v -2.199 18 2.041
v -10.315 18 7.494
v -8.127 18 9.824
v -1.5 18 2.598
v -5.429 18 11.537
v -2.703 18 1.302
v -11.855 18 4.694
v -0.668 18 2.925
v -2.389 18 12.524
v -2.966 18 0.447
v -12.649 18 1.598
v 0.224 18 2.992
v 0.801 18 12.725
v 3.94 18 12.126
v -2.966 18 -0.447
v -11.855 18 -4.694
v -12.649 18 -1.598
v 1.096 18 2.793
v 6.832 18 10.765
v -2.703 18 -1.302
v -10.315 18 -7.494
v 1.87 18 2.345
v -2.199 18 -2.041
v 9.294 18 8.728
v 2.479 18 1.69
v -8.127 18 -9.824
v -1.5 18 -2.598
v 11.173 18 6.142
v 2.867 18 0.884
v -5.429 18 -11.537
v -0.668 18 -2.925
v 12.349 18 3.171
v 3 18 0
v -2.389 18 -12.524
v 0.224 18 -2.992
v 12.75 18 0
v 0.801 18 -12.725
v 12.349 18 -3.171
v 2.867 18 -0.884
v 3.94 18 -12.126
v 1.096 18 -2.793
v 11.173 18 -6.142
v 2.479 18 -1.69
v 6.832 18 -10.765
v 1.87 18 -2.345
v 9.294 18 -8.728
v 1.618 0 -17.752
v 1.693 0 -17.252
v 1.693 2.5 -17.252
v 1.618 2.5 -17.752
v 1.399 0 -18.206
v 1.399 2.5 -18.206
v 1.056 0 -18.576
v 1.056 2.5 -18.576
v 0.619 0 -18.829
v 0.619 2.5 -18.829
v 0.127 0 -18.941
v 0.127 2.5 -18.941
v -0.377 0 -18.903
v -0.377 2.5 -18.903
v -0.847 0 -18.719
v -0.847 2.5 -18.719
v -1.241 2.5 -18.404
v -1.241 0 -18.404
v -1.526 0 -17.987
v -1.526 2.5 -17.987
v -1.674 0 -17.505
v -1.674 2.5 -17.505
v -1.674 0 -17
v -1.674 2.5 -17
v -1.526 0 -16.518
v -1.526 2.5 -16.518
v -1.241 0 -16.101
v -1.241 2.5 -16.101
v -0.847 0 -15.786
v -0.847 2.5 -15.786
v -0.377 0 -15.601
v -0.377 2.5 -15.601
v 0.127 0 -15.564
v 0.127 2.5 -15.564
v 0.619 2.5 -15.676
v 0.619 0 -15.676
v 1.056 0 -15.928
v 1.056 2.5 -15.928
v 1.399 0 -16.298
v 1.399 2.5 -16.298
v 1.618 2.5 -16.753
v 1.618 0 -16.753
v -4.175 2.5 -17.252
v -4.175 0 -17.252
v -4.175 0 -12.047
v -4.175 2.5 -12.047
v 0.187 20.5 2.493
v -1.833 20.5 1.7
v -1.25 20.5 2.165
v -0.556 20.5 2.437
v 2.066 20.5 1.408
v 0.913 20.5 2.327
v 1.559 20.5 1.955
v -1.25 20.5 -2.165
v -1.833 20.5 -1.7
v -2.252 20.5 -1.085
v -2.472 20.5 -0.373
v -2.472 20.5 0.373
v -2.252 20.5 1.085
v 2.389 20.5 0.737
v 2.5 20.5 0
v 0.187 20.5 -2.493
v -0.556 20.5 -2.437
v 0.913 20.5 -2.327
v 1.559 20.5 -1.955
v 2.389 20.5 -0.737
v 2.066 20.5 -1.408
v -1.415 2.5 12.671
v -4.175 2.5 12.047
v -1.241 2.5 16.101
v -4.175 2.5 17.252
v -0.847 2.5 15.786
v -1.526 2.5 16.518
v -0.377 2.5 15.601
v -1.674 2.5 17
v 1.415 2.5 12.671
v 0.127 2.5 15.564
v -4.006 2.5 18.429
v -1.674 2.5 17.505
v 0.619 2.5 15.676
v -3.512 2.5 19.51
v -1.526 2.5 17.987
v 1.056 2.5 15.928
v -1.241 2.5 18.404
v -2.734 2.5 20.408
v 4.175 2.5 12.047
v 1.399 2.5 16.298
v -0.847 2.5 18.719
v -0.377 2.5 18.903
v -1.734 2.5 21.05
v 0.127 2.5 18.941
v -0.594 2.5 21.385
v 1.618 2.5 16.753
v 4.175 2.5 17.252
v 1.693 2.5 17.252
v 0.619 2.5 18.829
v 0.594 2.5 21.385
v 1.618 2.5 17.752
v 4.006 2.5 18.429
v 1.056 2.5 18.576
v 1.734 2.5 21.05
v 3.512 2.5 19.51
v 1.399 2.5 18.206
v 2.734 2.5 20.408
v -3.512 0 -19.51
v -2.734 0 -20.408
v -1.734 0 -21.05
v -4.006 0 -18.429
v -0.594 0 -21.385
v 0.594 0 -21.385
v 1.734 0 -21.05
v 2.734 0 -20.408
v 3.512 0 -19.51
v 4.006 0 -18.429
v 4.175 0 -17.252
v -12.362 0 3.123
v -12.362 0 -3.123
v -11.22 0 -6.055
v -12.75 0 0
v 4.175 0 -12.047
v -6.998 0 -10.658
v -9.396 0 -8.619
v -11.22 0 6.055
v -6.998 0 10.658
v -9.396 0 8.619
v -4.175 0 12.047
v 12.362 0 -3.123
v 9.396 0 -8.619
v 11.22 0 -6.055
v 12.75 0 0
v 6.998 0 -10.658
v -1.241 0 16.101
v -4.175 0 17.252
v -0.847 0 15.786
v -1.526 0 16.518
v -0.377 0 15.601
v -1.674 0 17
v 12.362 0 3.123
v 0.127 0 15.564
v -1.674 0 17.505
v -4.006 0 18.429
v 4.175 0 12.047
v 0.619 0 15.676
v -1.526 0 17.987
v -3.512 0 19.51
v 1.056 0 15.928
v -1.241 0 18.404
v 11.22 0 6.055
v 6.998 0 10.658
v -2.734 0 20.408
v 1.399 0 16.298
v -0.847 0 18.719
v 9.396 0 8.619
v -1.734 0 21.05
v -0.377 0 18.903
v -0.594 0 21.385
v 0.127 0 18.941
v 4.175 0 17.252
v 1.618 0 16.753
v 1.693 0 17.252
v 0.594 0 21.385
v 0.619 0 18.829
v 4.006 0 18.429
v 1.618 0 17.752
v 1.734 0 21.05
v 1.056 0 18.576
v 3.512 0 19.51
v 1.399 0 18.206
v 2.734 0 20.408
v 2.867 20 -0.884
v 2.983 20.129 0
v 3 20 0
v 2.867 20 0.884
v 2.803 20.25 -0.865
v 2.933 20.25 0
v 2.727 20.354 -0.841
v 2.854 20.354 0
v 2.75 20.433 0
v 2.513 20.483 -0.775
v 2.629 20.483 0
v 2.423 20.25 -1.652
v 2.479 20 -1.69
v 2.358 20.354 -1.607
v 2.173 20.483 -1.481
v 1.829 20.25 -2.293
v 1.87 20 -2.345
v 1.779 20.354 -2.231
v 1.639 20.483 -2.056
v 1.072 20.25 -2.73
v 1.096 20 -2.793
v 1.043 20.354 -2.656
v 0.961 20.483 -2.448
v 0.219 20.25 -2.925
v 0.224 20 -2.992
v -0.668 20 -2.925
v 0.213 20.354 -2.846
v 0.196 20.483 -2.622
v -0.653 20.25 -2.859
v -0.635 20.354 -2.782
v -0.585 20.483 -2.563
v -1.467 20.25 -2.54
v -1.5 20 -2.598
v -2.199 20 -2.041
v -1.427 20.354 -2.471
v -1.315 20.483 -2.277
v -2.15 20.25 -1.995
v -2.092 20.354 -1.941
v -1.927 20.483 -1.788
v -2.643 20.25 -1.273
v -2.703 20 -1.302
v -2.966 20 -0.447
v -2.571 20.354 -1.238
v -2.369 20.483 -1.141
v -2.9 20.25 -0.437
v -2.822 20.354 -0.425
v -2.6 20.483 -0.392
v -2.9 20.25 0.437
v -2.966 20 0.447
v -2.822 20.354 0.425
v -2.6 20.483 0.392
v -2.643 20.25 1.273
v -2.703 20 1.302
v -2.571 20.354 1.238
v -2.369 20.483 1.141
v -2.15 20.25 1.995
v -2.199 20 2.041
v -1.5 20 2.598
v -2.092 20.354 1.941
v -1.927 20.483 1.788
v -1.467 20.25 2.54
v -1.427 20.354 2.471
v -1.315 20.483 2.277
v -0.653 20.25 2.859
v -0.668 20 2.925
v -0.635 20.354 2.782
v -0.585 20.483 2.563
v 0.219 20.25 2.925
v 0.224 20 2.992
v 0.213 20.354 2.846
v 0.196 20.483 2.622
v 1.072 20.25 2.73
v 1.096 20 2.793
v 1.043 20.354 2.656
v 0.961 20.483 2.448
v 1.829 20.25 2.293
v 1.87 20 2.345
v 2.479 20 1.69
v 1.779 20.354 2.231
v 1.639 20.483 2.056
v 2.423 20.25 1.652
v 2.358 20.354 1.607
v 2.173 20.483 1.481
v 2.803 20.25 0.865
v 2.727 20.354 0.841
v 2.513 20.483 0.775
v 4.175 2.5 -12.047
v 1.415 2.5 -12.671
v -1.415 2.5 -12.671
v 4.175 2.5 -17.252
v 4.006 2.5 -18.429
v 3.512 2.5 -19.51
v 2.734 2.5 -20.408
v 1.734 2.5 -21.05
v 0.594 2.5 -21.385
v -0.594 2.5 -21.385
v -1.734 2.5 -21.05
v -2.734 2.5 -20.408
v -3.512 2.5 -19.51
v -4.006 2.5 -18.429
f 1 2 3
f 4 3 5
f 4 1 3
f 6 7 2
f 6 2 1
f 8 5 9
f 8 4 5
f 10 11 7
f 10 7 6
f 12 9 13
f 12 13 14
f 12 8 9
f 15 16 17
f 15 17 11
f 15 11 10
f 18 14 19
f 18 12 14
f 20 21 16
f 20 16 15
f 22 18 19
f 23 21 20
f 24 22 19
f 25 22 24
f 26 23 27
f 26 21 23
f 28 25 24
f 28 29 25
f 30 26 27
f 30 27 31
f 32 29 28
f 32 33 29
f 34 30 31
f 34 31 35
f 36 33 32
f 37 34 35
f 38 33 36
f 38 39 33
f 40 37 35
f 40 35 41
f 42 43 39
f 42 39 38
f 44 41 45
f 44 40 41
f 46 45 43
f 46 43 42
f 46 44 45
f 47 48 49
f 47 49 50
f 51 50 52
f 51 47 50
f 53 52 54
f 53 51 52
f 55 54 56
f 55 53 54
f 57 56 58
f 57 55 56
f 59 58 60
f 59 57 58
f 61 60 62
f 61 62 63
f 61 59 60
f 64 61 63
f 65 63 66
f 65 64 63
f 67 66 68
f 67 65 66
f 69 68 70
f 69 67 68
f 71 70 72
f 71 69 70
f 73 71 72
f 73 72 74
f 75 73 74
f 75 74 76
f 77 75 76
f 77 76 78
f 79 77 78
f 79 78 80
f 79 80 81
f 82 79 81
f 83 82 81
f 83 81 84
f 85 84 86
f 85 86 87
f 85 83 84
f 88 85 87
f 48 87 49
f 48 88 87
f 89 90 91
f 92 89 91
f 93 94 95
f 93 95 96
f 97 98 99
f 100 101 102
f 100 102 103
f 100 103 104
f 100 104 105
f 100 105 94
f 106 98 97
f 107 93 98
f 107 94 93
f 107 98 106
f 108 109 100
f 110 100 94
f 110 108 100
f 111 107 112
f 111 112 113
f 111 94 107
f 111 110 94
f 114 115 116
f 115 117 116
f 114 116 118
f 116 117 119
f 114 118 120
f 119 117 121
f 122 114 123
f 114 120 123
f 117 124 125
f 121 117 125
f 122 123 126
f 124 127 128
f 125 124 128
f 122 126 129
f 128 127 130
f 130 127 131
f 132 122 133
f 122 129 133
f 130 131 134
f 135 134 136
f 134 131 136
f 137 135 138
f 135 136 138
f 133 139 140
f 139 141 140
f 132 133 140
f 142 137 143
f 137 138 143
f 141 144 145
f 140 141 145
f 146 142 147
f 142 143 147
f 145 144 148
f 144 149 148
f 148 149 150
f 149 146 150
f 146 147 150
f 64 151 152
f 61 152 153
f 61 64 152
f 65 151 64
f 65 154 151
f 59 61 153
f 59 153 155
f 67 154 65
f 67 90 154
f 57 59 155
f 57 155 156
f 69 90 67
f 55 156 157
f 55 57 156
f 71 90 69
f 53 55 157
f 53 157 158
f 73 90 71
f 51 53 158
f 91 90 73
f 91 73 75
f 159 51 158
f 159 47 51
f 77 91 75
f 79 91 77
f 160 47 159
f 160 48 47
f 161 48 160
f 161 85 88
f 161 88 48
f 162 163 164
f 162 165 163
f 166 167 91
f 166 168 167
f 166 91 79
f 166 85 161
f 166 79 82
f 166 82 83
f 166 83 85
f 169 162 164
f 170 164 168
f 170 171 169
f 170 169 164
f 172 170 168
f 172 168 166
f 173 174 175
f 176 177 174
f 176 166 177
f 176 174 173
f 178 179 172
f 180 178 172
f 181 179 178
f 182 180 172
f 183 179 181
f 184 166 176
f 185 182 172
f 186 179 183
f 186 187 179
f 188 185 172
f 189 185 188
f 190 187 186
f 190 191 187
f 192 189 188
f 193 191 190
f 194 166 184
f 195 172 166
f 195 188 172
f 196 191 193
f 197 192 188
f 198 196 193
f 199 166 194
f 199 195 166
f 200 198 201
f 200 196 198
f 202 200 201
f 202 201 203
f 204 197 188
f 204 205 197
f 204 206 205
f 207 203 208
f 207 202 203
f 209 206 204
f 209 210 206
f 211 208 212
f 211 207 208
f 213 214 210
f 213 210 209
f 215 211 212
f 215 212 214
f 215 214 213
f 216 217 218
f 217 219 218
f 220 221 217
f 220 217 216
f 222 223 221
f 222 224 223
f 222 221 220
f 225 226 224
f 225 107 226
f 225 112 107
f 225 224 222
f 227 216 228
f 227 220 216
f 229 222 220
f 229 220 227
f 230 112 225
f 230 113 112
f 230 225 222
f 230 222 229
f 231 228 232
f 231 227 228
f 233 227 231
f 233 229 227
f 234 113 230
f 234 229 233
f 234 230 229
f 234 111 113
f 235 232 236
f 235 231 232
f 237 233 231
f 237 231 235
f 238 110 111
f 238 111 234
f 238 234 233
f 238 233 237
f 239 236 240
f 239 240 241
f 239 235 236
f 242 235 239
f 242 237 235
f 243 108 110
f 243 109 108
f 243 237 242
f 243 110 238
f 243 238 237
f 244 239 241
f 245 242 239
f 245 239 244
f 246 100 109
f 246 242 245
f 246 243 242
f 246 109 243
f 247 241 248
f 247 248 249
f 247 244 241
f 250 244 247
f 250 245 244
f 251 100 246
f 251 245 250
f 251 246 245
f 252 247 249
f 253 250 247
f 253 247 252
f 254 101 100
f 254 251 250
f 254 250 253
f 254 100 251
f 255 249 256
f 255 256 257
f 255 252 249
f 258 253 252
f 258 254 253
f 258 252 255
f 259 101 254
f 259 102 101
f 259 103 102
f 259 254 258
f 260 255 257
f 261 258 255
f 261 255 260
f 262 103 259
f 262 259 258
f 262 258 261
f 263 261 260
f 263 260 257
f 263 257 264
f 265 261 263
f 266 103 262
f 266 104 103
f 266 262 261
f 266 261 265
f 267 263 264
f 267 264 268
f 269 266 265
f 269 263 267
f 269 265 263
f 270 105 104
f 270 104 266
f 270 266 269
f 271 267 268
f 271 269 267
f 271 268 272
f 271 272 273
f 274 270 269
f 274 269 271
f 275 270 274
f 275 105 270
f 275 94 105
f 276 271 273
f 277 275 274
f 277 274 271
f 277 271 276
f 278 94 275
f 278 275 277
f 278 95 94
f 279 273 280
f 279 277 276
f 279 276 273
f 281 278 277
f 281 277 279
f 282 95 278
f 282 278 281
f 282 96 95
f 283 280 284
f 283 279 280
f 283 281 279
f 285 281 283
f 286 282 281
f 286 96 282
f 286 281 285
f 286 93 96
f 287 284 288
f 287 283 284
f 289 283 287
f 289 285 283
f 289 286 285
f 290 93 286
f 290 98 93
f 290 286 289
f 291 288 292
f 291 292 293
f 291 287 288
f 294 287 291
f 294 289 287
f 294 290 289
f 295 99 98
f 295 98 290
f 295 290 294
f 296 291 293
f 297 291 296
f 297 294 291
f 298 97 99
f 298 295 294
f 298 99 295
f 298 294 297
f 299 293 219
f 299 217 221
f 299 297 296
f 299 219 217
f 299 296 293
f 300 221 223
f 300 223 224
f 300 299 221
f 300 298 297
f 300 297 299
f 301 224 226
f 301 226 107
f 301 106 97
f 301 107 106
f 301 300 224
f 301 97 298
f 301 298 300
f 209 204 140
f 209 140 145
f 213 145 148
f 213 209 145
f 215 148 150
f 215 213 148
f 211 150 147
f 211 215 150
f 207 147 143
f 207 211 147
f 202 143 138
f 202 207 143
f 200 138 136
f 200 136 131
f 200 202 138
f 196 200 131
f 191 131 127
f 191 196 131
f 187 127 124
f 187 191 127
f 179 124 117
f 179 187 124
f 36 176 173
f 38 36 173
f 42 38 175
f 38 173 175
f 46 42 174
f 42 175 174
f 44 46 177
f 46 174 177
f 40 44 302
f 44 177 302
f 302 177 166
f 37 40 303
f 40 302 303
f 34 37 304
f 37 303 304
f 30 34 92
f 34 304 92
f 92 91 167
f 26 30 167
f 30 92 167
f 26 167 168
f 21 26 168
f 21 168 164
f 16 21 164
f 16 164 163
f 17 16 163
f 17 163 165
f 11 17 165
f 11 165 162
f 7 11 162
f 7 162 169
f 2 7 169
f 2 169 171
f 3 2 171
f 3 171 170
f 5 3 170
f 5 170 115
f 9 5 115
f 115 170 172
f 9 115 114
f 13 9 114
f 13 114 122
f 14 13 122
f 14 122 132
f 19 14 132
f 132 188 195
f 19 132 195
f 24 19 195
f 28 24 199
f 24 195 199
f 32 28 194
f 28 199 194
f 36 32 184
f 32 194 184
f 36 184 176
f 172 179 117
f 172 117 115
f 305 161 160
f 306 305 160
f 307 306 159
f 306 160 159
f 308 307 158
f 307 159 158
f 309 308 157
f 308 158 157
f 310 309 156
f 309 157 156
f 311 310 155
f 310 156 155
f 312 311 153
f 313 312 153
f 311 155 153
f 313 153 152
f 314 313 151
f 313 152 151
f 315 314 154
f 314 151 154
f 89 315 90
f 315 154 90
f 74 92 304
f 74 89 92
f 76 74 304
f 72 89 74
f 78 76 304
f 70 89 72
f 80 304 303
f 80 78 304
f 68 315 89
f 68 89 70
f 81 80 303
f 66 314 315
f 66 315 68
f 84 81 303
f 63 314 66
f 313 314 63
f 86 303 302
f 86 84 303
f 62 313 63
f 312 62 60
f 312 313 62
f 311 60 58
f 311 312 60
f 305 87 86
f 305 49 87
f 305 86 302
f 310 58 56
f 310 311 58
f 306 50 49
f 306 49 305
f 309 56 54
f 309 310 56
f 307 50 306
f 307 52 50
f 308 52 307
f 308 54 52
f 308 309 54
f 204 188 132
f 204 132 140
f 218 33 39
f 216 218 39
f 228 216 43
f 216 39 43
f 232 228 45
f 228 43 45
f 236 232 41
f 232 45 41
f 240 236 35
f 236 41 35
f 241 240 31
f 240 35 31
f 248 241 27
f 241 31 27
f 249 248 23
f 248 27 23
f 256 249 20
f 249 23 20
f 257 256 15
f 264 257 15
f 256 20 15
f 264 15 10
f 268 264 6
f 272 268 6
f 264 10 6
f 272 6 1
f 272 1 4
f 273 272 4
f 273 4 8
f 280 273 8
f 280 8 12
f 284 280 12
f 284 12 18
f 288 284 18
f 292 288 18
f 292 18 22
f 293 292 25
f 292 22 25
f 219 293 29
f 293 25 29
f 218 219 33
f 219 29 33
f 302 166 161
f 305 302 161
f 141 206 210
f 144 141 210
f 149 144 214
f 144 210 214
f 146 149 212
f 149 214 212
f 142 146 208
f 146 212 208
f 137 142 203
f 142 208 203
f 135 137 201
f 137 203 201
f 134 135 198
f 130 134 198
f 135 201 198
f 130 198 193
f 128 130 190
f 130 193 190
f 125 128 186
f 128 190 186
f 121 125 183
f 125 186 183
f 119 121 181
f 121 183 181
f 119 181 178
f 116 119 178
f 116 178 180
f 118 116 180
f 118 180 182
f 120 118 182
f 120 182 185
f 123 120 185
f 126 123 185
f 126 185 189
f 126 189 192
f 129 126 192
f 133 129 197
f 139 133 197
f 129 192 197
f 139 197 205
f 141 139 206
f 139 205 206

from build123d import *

# Parameters (mm, degrees)
SKETCH1_R           = 12.75
BOSS_EXTRUDE1_DEPTH = 18
SKETCH2_R           = 3
BOSS_EXTRUDE2_DEPTH = 2.5
FILLET1_R           = 0.5
SKETCH3_R           = 1.69339008
BOSS_EXTRUDE3_DEPTH = 2.5


with BuildPart() as part:
    # Sketch1 → Boss-Extrude1 (new body)
    with BuildSketch(Plane(origin=(0, 0, 0), x_dir=(1, 0, 0), z_dir=(0, 1, 0))):
        Circle(SKETCH1_R)
    extrude(amount=BOSS_EXTRUDE1_DEPTH)

    # Sketch2 → Boss-Extrude2 (add)
    with BuildSketch(Plane(origin=(0, 18, 0), x_dir=(1, 0, 0), z_dir=(0, 1, 0))):
        Circle(SKETCH2_R)
    extrude(amount=BOSS_EXTRUDE2_DEPTH)

    # Fillet1
    fillet1_edges = [part.edges().sort_by_distance(p)[0] for p in [
        (-3, 20.5, 0),
    ]]
    fillet(fillet1_edges, radius=FILLET1_R)

    # Sketch3 → Boss-Extrude3 (add)
    with BuildSketch(Plane(origin=(0, 0, 0), x_dir=(1, 0, 0), z_dir=(0, 1, 0))):
        with BuildLine():
            Line((4.175, 12.047069146), (4.175, 17.252375634))
            ThreePointArc((4.175, 17.252375634), (0, 21.427375634), (-4.175, 17.252375634))
            Line((-4.175, 17.252375634), (-4.175, 12.047069146))
            Line((-4.175, 12.047069146), (4.175, 12.047069146))
        make_face()
        with Locations((0, 17.252375634)):
            Circle(SKETCH3_R, mode=Mode.SUBTRACT)
    boss_extrude3 = extrude(amount=BOSS_EXTRUDE3_DEPTH)

    # Mirror1: Boss-Extrude3 across plane
    add(boss_extrude3.mirror(Plane.XY))


solid = part.part
